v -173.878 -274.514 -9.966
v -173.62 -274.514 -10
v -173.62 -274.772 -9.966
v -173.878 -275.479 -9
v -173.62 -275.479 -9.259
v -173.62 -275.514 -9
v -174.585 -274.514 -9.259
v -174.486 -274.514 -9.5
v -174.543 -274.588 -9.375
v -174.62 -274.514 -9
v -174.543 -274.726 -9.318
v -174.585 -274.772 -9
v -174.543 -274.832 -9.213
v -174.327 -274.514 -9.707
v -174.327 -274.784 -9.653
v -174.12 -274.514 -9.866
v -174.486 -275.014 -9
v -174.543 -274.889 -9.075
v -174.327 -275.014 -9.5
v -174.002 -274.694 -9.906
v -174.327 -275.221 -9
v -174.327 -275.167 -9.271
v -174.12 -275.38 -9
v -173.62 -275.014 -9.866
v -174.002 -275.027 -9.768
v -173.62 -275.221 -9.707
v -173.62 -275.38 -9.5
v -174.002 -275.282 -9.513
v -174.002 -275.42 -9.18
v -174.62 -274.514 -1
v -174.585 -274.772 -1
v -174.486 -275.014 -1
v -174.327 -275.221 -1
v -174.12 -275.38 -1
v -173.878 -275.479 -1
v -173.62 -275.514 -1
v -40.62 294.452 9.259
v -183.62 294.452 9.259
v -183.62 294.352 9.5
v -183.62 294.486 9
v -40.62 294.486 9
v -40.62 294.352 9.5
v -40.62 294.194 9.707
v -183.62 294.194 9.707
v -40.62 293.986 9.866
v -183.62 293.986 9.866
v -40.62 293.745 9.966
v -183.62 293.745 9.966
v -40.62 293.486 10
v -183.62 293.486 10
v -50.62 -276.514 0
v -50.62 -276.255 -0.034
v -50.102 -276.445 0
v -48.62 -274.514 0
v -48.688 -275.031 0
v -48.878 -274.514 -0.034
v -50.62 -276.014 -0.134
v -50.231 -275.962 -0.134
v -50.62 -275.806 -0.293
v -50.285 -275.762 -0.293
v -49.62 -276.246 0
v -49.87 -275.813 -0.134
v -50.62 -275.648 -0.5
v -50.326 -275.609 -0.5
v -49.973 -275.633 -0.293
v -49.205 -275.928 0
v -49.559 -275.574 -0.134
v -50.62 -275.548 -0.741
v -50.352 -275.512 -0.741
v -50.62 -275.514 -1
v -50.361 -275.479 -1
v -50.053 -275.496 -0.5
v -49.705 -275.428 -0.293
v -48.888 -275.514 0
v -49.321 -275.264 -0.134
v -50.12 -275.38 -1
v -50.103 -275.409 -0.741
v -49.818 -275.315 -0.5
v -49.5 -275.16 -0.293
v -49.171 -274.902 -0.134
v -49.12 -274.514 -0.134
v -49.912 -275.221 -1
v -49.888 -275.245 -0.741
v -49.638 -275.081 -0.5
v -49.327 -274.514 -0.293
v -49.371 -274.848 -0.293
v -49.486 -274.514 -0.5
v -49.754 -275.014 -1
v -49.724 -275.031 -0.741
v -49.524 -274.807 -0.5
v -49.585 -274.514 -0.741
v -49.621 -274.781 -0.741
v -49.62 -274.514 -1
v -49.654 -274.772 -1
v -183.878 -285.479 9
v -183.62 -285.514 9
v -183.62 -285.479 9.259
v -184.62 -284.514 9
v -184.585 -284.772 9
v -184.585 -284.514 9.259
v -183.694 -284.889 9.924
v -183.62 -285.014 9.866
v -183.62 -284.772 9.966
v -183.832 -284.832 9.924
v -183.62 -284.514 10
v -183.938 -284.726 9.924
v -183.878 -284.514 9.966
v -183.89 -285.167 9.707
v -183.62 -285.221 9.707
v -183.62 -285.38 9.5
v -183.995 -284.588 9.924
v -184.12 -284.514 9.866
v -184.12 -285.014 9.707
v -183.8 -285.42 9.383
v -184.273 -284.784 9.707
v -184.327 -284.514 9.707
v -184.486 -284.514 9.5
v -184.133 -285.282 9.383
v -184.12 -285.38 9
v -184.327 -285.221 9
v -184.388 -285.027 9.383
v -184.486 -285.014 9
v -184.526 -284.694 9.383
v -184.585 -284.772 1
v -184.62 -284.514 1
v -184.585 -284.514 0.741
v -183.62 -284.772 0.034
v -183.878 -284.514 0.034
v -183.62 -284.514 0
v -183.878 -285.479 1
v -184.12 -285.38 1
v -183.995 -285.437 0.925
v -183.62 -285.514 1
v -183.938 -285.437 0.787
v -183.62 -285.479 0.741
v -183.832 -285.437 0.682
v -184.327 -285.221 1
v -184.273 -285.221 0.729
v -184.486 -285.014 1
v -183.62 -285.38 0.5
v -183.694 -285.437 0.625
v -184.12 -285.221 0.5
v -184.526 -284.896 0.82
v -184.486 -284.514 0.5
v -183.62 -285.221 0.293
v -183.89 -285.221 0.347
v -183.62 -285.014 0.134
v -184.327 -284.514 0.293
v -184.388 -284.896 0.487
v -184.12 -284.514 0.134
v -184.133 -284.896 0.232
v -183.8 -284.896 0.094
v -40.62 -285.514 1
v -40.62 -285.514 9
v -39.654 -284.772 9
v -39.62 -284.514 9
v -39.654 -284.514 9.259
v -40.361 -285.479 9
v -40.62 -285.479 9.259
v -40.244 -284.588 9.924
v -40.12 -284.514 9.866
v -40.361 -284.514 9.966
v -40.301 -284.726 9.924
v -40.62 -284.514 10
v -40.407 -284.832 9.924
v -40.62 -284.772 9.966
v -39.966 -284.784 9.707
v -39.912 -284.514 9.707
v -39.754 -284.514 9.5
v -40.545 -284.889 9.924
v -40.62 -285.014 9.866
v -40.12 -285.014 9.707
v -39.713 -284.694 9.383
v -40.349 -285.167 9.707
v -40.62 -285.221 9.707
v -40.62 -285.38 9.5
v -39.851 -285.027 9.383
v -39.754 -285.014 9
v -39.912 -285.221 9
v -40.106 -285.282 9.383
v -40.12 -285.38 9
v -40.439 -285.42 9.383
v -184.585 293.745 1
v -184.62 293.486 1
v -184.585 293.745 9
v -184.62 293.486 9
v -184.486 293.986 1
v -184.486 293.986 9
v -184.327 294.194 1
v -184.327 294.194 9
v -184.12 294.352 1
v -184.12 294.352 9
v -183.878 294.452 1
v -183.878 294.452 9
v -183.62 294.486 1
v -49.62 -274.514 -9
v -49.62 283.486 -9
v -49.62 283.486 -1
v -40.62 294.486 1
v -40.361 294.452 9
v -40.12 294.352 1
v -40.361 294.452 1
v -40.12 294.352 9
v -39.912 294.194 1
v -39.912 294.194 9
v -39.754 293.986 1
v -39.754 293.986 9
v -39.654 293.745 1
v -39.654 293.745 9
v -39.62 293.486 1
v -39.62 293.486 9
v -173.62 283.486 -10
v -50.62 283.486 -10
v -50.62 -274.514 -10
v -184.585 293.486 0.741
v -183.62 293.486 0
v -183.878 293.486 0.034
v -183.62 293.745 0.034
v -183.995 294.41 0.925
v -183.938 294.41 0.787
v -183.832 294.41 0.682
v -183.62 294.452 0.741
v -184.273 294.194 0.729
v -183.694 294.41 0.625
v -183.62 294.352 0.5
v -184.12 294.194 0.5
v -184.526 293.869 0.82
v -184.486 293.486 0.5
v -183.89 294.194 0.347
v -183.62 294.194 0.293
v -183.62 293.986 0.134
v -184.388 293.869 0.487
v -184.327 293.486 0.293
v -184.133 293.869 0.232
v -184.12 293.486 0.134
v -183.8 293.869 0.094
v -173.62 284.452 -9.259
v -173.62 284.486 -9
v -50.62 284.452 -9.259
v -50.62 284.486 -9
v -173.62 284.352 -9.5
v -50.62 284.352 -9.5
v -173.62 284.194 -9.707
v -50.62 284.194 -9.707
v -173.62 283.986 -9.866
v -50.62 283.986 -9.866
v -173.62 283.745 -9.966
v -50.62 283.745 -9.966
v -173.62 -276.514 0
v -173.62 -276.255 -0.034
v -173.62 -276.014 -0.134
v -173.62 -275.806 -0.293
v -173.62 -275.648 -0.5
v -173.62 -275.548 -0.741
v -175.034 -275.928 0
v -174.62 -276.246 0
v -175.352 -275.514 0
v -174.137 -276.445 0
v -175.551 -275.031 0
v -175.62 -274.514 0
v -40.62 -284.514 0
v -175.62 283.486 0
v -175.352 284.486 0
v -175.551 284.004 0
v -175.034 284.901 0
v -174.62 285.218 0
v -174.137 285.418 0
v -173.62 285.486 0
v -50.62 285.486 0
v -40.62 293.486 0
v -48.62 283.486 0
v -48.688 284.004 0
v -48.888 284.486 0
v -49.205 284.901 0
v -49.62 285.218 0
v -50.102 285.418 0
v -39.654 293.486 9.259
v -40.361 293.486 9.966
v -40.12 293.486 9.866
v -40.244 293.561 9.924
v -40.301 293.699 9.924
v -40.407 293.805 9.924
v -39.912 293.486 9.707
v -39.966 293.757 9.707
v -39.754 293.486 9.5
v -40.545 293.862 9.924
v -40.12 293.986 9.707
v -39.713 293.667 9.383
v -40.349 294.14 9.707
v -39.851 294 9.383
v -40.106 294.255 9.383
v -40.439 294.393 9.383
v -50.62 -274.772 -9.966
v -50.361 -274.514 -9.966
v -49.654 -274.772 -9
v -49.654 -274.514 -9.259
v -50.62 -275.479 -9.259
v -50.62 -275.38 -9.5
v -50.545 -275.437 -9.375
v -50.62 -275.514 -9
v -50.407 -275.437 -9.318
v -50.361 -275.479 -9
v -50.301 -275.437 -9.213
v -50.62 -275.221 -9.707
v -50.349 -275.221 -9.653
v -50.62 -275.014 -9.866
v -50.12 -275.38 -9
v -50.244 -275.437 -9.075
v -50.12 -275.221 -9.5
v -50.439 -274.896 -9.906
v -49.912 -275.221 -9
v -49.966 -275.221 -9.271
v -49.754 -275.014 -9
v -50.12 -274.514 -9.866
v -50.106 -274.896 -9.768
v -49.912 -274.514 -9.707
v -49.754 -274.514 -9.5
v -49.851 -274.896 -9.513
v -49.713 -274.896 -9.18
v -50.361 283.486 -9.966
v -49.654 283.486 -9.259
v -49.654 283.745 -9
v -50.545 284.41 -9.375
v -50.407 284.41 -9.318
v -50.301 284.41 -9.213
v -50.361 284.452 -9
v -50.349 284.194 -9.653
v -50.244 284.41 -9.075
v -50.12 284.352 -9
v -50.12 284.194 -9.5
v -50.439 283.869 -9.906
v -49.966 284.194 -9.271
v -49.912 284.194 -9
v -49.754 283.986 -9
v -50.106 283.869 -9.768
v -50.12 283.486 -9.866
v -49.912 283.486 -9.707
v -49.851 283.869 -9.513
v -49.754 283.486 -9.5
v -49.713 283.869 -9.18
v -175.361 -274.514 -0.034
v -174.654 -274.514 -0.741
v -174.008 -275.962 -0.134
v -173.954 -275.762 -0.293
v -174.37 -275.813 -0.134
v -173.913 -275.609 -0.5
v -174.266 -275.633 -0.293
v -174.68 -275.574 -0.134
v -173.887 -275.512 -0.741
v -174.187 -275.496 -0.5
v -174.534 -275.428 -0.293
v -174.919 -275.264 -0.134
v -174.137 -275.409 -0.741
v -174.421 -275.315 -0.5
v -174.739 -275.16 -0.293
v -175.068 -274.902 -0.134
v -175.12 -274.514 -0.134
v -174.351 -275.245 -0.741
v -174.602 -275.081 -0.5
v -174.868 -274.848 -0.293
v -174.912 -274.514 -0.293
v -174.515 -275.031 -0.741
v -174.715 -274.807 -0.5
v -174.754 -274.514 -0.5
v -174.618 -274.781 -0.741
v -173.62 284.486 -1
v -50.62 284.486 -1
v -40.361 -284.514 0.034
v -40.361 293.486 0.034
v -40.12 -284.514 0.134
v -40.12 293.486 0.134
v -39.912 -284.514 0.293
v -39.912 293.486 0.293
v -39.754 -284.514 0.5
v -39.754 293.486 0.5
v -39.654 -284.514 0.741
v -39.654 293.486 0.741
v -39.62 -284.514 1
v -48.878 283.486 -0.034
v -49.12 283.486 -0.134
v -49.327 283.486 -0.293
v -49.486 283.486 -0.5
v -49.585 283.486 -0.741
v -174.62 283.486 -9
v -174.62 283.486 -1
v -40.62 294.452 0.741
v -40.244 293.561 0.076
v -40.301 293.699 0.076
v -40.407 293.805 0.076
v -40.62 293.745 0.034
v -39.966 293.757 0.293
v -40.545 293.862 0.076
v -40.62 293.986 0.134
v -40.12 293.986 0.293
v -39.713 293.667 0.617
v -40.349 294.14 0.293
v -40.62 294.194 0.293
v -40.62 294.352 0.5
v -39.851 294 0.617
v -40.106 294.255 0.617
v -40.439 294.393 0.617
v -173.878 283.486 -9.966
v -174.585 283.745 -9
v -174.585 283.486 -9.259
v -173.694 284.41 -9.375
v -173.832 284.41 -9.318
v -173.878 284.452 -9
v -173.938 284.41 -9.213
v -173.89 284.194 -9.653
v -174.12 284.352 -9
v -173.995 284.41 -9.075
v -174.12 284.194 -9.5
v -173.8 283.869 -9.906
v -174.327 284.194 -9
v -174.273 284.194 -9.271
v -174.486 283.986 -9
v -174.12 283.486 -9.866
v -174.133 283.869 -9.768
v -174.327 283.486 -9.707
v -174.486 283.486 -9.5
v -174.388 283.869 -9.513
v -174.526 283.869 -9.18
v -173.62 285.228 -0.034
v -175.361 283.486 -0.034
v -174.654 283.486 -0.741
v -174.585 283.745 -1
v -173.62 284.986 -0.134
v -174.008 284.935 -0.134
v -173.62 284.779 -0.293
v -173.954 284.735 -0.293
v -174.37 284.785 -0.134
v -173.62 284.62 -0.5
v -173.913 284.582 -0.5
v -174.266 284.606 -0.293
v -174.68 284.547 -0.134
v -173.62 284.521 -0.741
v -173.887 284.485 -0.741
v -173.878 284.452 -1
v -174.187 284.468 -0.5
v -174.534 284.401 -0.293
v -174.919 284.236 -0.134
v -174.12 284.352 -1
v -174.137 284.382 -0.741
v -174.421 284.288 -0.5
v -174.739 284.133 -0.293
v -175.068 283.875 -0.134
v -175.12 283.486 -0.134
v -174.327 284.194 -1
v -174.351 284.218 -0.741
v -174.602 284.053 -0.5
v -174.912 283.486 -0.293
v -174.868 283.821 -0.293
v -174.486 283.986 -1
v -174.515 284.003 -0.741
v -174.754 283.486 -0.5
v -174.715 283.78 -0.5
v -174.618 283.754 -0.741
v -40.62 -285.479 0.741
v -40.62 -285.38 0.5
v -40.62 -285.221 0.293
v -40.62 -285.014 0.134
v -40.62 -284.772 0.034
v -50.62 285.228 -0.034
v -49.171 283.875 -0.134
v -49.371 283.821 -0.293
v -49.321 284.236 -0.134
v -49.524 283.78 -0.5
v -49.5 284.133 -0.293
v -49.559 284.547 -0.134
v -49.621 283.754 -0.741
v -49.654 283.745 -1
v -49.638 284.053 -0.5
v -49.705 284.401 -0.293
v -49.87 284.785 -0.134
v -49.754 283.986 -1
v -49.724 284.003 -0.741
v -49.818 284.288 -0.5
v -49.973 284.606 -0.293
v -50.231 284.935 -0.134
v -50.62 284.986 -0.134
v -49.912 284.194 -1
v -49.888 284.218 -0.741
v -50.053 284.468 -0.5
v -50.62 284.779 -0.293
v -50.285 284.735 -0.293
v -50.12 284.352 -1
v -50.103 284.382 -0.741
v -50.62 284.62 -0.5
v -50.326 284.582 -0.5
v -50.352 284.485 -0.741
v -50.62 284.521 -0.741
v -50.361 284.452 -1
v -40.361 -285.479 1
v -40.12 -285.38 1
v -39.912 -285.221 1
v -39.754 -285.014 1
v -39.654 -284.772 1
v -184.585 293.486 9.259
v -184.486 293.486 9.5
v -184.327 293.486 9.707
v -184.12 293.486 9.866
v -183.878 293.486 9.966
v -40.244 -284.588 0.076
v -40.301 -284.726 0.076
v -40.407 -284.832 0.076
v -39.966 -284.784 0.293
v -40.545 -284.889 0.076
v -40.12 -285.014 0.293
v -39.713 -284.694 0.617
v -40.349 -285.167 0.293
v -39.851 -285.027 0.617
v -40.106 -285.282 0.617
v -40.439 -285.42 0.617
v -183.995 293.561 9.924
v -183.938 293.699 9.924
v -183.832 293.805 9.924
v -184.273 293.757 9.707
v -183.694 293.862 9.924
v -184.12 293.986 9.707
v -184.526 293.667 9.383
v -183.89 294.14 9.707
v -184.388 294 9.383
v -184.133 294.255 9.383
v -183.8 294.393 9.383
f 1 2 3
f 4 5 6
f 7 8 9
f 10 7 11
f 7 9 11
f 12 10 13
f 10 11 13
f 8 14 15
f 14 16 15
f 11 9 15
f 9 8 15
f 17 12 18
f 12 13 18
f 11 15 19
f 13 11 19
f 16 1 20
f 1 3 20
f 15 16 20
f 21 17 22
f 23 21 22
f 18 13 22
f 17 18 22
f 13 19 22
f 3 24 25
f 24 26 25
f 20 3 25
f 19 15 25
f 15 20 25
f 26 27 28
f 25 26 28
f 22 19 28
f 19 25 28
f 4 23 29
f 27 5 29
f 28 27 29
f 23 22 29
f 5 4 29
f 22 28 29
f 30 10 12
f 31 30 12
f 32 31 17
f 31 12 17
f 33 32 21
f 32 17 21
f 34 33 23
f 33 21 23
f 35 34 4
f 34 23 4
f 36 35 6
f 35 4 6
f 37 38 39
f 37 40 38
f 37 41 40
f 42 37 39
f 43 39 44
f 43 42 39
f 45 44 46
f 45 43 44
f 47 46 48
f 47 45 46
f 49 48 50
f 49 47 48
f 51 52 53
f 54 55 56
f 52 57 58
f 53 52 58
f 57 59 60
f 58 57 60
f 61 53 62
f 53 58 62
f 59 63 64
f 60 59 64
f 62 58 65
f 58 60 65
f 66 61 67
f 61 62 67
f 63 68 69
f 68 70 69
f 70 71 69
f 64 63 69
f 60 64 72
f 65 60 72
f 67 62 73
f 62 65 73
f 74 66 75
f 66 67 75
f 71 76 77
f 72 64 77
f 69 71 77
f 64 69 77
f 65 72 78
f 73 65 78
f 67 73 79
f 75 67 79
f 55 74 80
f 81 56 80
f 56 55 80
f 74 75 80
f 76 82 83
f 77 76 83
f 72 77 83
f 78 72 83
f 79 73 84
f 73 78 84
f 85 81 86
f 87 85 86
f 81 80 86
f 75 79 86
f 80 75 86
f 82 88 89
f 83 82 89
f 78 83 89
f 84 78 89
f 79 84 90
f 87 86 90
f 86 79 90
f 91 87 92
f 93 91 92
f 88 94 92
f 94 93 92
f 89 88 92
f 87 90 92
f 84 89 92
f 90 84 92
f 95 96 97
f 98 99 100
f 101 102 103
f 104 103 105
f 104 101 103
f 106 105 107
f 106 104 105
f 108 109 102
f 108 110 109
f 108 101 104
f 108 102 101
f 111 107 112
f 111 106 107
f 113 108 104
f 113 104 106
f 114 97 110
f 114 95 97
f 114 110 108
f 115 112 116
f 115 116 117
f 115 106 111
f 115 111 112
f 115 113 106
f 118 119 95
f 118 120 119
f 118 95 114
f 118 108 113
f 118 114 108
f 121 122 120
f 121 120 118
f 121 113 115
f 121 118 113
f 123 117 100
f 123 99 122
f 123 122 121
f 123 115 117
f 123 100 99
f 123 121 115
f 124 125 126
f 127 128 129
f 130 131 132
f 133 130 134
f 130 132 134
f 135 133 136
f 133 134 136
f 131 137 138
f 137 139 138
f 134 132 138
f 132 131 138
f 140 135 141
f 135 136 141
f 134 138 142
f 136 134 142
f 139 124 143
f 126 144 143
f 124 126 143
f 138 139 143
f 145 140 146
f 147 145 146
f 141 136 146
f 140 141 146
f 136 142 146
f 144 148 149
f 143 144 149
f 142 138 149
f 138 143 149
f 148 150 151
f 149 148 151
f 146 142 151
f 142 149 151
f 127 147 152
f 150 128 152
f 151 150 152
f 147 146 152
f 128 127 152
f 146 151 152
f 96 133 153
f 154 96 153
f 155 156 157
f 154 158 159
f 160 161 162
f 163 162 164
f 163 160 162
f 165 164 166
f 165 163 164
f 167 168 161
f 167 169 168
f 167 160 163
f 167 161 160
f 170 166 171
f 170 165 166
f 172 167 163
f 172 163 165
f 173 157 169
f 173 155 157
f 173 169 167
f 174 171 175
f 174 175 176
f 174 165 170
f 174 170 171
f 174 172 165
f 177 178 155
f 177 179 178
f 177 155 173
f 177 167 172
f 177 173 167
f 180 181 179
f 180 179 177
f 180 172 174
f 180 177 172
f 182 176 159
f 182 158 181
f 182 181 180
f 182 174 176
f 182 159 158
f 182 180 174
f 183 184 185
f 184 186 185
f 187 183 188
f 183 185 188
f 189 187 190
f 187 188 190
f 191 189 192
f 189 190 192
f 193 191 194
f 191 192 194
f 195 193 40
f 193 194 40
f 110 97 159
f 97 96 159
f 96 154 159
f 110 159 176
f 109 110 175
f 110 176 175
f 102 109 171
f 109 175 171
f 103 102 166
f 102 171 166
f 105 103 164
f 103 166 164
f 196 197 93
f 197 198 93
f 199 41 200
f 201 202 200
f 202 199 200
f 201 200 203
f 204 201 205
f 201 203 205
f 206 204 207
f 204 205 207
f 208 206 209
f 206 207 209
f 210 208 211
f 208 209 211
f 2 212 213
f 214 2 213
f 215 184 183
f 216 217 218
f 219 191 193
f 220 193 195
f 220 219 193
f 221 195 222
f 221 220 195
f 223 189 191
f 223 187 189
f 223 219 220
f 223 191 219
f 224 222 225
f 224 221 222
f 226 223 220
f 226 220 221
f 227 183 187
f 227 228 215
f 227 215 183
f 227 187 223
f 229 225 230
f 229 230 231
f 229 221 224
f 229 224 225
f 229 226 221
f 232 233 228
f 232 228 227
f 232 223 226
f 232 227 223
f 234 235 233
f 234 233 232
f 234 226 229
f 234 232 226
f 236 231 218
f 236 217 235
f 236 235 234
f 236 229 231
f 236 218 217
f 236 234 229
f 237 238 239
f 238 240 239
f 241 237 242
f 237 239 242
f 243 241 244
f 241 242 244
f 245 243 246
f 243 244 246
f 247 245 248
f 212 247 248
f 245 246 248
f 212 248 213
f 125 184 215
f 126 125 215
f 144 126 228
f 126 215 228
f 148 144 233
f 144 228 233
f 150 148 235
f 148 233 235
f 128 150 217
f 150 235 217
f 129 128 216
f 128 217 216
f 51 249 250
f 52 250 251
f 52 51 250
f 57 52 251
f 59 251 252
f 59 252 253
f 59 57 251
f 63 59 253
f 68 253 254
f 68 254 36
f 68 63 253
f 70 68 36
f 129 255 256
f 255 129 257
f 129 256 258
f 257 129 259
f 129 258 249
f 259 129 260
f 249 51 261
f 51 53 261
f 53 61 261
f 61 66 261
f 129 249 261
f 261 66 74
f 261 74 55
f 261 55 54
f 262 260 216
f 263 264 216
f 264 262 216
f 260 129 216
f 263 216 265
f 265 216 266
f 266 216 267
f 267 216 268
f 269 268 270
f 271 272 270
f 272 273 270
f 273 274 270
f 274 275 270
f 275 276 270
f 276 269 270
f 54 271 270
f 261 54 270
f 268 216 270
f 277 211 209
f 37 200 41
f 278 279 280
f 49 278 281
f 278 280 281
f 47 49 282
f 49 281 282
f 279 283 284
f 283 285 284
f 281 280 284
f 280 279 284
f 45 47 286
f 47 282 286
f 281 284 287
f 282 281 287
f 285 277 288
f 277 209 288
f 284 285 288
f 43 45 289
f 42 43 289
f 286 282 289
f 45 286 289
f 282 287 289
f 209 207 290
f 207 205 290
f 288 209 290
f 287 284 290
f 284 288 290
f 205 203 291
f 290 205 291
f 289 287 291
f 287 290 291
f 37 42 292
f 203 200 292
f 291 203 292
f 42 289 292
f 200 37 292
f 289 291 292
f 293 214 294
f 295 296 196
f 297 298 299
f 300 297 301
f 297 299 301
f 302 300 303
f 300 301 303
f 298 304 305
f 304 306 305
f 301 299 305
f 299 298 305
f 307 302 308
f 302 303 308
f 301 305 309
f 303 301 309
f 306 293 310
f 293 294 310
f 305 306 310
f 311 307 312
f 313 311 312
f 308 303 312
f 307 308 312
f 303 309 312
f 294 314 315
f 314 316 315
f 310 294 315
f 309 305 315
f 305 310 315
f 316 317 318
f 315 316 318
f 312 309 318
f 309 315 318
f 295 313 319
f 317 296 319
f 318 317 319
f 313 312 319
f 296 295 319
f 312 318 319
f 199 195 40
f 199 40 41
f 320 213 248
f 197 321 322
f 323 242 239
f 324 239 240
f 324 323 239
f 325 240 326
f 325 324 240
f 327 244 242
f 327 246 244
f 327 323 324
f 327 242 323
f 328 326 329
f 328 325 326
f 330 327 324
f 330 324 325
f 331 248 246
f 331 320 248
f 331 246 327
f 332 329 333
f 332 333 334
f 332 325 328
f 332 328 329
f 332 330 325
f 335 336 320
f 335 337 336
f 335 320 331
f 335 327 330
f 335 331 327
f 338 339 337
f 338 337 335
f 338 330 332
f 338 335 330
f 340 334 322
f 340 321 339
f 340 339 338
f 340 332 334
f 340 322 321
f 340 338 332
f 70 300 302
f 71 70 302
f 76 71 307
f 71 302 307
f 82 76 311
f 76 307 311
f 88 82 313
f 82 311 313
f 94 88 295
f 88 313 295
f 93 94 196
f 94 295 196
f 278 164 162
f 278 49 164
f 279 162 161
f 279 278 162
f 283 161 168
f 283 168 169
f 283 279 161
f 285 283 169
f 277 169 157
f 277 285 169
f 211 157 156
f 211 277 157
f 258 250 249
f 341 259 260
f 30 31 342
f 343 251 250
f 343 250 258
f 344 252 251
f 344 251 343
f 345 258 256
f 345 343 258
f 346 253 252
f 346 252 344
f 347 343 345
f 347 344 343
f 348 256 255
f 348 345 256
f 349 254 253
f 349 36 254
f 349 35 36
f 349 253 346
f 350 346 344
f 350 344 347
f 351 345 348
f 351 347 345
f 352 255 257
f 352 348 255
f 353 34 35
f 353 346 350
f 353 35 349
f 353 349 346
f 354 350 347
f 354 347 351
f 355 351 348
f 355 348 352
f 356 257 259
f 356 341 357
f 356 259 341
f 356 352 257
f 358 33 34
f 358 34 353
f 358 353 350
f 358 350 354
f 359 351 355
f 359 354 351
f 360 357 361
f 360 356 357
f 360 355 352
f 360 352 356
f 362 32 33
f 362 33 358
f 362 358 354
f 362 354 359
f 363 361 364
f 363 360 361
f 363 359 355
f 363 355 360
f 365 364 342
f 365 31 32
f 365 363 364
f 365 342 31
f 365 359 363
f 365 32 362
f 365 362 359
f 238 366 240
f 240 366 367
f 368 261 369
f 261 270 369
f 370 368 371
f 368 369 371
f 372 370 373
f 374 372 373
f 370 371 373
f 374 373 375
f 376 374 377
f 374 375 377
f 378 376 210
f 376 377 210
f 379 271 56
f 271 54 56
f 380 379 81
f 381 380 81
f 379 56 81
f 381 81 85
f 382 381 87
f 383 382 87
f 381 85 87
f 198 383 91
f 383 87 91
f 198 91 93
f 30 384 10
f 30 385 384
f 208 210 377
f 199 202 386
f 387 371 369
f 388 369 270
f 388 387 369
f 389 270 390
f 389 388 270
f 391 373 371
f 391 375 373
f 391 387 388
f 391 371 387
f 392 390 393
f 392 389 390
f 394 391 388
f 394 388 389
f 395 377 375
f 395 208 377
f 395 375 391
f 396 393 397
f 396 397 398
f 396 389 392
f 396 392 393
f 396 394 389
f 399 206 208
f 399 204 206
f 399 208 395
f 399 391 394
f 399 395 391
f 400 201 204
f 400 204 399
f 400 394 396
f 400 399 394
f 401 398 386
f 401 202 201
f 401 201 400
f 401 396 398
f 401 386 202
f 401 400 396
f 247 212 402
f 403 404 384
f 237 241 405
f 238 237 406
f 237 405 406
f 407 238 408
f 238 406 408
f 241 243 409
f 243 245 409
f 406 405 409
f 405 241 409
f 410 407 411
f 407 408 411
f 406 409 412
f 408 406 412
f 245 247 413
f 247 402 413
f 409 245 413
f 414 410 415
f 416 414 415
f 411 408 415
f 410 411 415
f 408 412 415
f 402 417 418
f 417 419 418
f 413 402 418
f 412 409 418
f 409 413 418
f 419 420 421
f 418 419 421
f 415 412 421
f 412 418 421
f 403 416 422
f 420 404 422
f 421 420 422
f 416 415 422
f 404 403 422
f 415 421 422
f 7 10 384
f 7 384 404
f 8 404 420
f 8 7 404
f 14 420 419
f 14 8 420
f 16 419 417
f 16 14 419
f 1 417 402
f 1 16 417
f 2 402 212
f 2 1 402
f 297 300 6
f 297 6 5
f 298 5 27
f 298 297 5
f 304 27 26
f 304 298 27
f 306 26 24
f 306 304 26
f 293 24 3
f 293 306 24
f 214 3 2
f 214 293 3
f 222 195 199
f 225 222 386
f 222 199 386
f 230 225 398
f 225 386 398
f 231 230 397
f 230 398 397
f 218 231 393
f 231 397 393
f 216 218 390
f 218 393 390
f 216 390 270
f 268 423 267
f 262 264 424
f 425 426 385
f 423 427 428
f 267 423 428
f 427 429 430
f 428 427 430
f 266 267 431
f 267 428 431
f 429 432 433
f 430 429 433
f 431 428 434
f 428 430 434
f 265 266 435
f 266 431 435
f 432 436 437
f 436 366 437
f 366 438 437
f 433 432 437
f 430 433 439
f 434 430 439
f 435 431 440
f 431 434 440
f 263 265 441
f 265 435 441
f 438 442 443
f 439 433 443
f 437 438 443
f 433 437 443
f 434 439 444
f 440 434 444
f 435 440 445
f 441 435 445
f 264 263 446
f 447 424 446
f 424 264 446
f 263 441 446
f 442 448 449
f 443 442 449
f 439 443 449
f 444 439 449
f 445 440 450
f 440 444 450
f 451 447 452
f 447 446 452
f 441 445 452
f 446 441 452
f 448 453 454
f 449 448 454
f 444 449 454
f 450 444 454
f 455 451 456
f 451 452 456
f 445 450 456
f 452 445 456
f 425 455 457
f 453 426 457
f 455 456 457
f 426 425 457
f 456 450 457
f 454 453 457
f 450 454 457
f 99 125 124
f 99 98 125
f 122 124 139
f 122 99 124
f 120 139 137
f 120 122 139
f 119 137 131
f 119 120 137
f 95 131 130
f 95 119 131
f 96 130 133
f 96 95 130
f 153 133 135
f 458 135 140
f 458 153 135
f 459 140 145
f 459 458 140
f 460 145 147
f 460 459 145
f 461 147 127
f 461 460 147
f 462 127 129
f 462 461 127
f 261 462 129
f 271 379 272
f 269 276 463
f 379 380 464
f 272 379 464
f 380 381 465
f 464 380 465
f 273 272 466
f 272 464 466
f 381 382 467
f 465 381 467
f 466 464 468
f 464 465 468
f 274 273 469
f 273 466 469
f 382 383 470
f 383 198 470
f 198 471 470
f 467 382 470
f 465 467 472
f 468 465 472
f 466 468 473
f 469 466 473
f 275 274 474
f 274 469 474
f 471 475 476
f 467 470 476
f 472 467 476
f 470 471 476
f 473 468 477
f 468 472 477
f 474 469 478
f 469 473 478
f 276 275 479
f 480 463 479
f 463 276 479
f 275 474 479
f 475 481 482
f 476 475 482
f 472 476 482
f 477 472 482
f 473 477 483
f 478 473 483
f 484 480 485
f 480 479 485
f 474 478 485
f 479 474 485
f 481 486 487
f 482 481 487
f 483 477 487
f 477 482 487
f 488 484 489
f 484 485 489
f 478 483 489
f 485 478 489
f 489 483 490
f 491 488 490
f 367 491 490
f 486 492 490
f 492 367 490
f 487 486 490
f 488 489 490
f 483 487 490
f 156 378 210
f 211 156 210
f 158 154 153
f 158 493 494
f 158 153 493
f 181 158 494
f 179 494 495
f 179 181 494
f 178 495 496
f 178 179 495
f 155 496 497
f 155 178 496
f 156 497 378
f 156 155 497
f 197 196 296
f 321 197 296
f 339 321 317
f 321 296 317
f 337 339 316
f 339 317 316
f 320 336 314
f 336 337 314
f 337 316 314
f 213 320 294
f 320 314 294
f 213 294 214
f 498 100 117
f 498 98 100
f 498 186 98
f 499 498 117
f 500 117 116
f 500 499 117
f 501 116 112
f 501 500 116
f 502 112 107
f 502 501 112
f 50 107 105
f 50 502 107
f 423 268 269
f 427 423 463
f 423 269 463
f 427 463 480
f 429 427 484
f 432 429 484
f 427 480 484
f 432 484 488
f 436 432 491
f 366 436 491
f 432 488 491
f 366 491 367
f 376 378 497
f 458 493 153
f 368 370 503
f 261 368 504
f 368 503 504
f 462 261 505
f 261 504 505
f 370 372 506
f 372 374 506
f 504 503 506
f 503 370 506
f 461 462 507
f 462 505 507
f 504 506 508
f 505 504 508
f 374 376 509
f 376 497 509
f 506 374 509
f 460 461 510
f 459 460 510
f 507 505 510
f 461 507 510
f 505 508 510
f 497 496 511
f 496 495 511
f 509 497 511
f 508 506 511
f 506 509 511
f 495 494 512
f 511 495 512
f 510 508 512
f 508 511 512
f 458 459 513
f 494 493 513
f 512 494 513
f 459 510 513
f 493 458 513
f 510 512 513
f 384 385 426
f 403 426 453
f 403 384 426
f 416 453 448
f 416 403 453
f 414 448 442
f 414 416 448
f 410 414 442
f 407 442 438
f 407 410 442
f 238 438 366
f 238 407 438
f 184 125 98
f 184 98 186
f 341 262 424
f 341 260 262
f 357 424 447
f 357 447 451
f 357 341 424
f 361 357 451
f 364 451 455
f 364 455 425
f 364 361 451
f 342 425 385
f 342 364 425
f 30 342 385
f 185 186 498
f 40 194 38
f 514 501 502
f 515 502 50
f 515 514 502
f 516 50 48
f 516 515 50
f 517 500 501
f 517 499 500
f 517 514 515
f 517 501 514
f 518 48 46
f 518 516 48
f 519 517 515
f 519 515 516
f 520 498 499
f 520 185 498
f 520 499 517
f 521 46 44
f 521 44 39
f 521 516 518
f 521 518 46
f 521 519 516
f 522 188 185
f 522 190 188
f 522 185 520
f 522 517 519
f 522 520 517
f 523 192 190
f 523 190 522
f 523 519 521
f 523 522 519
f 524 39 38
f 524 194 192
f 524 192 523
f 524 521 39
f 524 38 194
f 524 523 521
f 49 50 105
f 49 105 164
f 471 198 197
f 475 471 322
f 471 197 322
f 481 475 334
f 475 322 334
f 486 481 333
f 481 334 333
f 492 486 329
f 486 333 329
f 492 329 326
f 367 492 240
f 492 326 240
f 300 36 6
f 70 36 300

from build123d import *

# Parameters (mm, degrees)
F0_W     = 145
F0_H     = 580
F1_DEPTH = 10
F2_W     = 125
F2_H     = 560
F3_DEPTH = 10
F4_R     = 1


with BuildPart() as f1:
    # F0 (on Top) → F1 (new body)
    with BuildSketch(Plane.XY):
        with Locations((-112.119565, 4.486432)):
            Rectangle(F0_W, F0_H)
    extrude(amount=F1_DEPTH)

    # F2 (on face) → F3 (join)
    with BuildSketch(Plane(origin=(0, 0, 0), x_dir=(1, 0, 0), z_dir=(0, 0, -1))):
        with Locations((-112.119565, -4.486432)):
            Rectangle(F2_W, F2_H)
    extrude(amount=F3_DEPTH)

    # F4
    f4_edges = [f1.edges().sort_by_distance(p)[0] for p in [
        (-49.619565, 4.486432, -10),
        (-112.119565, -275.513568, -10),
        (-174.619565, 4.486432, -10),
        (-112.119565, 284.486432, -10),
        (-184.619565, 4.486432, 0),
        (-49.619565, -275.513568, -5),
        (-174.619565, -275.513568, -5),
        (-112.119565, -275.513568, 0),
        (-49.619565, 284.486432, -5),
        (-49.619565, 4.486432, 0),
        (-39.619565, -285.513568, 5),
        (-39.619565, 294.486432, 5),
        (-39.619565, 4.486432, 0),
        (-39.619565, 4.486432, 10),
        (-184.619565, -285.513568, 5),
        (-112.119565, -285.513568, 0),
        (-112.119565, -285.513568, 10),
        (-184.619565, 294.486432, 5),
        (-184.619565, 4.486432, 10),
        (-112.119565, 294.486432, 0),
        (-112.119565, 294.486432, 10),
        (-174.619565, 284.486432, -5),
        (-112.119565, 284.486432, 0),
        (-174.619565, 4.486432, 0),
    ]]
    fillet(f4_edges, radius=F4_R)


solid = f1.part
